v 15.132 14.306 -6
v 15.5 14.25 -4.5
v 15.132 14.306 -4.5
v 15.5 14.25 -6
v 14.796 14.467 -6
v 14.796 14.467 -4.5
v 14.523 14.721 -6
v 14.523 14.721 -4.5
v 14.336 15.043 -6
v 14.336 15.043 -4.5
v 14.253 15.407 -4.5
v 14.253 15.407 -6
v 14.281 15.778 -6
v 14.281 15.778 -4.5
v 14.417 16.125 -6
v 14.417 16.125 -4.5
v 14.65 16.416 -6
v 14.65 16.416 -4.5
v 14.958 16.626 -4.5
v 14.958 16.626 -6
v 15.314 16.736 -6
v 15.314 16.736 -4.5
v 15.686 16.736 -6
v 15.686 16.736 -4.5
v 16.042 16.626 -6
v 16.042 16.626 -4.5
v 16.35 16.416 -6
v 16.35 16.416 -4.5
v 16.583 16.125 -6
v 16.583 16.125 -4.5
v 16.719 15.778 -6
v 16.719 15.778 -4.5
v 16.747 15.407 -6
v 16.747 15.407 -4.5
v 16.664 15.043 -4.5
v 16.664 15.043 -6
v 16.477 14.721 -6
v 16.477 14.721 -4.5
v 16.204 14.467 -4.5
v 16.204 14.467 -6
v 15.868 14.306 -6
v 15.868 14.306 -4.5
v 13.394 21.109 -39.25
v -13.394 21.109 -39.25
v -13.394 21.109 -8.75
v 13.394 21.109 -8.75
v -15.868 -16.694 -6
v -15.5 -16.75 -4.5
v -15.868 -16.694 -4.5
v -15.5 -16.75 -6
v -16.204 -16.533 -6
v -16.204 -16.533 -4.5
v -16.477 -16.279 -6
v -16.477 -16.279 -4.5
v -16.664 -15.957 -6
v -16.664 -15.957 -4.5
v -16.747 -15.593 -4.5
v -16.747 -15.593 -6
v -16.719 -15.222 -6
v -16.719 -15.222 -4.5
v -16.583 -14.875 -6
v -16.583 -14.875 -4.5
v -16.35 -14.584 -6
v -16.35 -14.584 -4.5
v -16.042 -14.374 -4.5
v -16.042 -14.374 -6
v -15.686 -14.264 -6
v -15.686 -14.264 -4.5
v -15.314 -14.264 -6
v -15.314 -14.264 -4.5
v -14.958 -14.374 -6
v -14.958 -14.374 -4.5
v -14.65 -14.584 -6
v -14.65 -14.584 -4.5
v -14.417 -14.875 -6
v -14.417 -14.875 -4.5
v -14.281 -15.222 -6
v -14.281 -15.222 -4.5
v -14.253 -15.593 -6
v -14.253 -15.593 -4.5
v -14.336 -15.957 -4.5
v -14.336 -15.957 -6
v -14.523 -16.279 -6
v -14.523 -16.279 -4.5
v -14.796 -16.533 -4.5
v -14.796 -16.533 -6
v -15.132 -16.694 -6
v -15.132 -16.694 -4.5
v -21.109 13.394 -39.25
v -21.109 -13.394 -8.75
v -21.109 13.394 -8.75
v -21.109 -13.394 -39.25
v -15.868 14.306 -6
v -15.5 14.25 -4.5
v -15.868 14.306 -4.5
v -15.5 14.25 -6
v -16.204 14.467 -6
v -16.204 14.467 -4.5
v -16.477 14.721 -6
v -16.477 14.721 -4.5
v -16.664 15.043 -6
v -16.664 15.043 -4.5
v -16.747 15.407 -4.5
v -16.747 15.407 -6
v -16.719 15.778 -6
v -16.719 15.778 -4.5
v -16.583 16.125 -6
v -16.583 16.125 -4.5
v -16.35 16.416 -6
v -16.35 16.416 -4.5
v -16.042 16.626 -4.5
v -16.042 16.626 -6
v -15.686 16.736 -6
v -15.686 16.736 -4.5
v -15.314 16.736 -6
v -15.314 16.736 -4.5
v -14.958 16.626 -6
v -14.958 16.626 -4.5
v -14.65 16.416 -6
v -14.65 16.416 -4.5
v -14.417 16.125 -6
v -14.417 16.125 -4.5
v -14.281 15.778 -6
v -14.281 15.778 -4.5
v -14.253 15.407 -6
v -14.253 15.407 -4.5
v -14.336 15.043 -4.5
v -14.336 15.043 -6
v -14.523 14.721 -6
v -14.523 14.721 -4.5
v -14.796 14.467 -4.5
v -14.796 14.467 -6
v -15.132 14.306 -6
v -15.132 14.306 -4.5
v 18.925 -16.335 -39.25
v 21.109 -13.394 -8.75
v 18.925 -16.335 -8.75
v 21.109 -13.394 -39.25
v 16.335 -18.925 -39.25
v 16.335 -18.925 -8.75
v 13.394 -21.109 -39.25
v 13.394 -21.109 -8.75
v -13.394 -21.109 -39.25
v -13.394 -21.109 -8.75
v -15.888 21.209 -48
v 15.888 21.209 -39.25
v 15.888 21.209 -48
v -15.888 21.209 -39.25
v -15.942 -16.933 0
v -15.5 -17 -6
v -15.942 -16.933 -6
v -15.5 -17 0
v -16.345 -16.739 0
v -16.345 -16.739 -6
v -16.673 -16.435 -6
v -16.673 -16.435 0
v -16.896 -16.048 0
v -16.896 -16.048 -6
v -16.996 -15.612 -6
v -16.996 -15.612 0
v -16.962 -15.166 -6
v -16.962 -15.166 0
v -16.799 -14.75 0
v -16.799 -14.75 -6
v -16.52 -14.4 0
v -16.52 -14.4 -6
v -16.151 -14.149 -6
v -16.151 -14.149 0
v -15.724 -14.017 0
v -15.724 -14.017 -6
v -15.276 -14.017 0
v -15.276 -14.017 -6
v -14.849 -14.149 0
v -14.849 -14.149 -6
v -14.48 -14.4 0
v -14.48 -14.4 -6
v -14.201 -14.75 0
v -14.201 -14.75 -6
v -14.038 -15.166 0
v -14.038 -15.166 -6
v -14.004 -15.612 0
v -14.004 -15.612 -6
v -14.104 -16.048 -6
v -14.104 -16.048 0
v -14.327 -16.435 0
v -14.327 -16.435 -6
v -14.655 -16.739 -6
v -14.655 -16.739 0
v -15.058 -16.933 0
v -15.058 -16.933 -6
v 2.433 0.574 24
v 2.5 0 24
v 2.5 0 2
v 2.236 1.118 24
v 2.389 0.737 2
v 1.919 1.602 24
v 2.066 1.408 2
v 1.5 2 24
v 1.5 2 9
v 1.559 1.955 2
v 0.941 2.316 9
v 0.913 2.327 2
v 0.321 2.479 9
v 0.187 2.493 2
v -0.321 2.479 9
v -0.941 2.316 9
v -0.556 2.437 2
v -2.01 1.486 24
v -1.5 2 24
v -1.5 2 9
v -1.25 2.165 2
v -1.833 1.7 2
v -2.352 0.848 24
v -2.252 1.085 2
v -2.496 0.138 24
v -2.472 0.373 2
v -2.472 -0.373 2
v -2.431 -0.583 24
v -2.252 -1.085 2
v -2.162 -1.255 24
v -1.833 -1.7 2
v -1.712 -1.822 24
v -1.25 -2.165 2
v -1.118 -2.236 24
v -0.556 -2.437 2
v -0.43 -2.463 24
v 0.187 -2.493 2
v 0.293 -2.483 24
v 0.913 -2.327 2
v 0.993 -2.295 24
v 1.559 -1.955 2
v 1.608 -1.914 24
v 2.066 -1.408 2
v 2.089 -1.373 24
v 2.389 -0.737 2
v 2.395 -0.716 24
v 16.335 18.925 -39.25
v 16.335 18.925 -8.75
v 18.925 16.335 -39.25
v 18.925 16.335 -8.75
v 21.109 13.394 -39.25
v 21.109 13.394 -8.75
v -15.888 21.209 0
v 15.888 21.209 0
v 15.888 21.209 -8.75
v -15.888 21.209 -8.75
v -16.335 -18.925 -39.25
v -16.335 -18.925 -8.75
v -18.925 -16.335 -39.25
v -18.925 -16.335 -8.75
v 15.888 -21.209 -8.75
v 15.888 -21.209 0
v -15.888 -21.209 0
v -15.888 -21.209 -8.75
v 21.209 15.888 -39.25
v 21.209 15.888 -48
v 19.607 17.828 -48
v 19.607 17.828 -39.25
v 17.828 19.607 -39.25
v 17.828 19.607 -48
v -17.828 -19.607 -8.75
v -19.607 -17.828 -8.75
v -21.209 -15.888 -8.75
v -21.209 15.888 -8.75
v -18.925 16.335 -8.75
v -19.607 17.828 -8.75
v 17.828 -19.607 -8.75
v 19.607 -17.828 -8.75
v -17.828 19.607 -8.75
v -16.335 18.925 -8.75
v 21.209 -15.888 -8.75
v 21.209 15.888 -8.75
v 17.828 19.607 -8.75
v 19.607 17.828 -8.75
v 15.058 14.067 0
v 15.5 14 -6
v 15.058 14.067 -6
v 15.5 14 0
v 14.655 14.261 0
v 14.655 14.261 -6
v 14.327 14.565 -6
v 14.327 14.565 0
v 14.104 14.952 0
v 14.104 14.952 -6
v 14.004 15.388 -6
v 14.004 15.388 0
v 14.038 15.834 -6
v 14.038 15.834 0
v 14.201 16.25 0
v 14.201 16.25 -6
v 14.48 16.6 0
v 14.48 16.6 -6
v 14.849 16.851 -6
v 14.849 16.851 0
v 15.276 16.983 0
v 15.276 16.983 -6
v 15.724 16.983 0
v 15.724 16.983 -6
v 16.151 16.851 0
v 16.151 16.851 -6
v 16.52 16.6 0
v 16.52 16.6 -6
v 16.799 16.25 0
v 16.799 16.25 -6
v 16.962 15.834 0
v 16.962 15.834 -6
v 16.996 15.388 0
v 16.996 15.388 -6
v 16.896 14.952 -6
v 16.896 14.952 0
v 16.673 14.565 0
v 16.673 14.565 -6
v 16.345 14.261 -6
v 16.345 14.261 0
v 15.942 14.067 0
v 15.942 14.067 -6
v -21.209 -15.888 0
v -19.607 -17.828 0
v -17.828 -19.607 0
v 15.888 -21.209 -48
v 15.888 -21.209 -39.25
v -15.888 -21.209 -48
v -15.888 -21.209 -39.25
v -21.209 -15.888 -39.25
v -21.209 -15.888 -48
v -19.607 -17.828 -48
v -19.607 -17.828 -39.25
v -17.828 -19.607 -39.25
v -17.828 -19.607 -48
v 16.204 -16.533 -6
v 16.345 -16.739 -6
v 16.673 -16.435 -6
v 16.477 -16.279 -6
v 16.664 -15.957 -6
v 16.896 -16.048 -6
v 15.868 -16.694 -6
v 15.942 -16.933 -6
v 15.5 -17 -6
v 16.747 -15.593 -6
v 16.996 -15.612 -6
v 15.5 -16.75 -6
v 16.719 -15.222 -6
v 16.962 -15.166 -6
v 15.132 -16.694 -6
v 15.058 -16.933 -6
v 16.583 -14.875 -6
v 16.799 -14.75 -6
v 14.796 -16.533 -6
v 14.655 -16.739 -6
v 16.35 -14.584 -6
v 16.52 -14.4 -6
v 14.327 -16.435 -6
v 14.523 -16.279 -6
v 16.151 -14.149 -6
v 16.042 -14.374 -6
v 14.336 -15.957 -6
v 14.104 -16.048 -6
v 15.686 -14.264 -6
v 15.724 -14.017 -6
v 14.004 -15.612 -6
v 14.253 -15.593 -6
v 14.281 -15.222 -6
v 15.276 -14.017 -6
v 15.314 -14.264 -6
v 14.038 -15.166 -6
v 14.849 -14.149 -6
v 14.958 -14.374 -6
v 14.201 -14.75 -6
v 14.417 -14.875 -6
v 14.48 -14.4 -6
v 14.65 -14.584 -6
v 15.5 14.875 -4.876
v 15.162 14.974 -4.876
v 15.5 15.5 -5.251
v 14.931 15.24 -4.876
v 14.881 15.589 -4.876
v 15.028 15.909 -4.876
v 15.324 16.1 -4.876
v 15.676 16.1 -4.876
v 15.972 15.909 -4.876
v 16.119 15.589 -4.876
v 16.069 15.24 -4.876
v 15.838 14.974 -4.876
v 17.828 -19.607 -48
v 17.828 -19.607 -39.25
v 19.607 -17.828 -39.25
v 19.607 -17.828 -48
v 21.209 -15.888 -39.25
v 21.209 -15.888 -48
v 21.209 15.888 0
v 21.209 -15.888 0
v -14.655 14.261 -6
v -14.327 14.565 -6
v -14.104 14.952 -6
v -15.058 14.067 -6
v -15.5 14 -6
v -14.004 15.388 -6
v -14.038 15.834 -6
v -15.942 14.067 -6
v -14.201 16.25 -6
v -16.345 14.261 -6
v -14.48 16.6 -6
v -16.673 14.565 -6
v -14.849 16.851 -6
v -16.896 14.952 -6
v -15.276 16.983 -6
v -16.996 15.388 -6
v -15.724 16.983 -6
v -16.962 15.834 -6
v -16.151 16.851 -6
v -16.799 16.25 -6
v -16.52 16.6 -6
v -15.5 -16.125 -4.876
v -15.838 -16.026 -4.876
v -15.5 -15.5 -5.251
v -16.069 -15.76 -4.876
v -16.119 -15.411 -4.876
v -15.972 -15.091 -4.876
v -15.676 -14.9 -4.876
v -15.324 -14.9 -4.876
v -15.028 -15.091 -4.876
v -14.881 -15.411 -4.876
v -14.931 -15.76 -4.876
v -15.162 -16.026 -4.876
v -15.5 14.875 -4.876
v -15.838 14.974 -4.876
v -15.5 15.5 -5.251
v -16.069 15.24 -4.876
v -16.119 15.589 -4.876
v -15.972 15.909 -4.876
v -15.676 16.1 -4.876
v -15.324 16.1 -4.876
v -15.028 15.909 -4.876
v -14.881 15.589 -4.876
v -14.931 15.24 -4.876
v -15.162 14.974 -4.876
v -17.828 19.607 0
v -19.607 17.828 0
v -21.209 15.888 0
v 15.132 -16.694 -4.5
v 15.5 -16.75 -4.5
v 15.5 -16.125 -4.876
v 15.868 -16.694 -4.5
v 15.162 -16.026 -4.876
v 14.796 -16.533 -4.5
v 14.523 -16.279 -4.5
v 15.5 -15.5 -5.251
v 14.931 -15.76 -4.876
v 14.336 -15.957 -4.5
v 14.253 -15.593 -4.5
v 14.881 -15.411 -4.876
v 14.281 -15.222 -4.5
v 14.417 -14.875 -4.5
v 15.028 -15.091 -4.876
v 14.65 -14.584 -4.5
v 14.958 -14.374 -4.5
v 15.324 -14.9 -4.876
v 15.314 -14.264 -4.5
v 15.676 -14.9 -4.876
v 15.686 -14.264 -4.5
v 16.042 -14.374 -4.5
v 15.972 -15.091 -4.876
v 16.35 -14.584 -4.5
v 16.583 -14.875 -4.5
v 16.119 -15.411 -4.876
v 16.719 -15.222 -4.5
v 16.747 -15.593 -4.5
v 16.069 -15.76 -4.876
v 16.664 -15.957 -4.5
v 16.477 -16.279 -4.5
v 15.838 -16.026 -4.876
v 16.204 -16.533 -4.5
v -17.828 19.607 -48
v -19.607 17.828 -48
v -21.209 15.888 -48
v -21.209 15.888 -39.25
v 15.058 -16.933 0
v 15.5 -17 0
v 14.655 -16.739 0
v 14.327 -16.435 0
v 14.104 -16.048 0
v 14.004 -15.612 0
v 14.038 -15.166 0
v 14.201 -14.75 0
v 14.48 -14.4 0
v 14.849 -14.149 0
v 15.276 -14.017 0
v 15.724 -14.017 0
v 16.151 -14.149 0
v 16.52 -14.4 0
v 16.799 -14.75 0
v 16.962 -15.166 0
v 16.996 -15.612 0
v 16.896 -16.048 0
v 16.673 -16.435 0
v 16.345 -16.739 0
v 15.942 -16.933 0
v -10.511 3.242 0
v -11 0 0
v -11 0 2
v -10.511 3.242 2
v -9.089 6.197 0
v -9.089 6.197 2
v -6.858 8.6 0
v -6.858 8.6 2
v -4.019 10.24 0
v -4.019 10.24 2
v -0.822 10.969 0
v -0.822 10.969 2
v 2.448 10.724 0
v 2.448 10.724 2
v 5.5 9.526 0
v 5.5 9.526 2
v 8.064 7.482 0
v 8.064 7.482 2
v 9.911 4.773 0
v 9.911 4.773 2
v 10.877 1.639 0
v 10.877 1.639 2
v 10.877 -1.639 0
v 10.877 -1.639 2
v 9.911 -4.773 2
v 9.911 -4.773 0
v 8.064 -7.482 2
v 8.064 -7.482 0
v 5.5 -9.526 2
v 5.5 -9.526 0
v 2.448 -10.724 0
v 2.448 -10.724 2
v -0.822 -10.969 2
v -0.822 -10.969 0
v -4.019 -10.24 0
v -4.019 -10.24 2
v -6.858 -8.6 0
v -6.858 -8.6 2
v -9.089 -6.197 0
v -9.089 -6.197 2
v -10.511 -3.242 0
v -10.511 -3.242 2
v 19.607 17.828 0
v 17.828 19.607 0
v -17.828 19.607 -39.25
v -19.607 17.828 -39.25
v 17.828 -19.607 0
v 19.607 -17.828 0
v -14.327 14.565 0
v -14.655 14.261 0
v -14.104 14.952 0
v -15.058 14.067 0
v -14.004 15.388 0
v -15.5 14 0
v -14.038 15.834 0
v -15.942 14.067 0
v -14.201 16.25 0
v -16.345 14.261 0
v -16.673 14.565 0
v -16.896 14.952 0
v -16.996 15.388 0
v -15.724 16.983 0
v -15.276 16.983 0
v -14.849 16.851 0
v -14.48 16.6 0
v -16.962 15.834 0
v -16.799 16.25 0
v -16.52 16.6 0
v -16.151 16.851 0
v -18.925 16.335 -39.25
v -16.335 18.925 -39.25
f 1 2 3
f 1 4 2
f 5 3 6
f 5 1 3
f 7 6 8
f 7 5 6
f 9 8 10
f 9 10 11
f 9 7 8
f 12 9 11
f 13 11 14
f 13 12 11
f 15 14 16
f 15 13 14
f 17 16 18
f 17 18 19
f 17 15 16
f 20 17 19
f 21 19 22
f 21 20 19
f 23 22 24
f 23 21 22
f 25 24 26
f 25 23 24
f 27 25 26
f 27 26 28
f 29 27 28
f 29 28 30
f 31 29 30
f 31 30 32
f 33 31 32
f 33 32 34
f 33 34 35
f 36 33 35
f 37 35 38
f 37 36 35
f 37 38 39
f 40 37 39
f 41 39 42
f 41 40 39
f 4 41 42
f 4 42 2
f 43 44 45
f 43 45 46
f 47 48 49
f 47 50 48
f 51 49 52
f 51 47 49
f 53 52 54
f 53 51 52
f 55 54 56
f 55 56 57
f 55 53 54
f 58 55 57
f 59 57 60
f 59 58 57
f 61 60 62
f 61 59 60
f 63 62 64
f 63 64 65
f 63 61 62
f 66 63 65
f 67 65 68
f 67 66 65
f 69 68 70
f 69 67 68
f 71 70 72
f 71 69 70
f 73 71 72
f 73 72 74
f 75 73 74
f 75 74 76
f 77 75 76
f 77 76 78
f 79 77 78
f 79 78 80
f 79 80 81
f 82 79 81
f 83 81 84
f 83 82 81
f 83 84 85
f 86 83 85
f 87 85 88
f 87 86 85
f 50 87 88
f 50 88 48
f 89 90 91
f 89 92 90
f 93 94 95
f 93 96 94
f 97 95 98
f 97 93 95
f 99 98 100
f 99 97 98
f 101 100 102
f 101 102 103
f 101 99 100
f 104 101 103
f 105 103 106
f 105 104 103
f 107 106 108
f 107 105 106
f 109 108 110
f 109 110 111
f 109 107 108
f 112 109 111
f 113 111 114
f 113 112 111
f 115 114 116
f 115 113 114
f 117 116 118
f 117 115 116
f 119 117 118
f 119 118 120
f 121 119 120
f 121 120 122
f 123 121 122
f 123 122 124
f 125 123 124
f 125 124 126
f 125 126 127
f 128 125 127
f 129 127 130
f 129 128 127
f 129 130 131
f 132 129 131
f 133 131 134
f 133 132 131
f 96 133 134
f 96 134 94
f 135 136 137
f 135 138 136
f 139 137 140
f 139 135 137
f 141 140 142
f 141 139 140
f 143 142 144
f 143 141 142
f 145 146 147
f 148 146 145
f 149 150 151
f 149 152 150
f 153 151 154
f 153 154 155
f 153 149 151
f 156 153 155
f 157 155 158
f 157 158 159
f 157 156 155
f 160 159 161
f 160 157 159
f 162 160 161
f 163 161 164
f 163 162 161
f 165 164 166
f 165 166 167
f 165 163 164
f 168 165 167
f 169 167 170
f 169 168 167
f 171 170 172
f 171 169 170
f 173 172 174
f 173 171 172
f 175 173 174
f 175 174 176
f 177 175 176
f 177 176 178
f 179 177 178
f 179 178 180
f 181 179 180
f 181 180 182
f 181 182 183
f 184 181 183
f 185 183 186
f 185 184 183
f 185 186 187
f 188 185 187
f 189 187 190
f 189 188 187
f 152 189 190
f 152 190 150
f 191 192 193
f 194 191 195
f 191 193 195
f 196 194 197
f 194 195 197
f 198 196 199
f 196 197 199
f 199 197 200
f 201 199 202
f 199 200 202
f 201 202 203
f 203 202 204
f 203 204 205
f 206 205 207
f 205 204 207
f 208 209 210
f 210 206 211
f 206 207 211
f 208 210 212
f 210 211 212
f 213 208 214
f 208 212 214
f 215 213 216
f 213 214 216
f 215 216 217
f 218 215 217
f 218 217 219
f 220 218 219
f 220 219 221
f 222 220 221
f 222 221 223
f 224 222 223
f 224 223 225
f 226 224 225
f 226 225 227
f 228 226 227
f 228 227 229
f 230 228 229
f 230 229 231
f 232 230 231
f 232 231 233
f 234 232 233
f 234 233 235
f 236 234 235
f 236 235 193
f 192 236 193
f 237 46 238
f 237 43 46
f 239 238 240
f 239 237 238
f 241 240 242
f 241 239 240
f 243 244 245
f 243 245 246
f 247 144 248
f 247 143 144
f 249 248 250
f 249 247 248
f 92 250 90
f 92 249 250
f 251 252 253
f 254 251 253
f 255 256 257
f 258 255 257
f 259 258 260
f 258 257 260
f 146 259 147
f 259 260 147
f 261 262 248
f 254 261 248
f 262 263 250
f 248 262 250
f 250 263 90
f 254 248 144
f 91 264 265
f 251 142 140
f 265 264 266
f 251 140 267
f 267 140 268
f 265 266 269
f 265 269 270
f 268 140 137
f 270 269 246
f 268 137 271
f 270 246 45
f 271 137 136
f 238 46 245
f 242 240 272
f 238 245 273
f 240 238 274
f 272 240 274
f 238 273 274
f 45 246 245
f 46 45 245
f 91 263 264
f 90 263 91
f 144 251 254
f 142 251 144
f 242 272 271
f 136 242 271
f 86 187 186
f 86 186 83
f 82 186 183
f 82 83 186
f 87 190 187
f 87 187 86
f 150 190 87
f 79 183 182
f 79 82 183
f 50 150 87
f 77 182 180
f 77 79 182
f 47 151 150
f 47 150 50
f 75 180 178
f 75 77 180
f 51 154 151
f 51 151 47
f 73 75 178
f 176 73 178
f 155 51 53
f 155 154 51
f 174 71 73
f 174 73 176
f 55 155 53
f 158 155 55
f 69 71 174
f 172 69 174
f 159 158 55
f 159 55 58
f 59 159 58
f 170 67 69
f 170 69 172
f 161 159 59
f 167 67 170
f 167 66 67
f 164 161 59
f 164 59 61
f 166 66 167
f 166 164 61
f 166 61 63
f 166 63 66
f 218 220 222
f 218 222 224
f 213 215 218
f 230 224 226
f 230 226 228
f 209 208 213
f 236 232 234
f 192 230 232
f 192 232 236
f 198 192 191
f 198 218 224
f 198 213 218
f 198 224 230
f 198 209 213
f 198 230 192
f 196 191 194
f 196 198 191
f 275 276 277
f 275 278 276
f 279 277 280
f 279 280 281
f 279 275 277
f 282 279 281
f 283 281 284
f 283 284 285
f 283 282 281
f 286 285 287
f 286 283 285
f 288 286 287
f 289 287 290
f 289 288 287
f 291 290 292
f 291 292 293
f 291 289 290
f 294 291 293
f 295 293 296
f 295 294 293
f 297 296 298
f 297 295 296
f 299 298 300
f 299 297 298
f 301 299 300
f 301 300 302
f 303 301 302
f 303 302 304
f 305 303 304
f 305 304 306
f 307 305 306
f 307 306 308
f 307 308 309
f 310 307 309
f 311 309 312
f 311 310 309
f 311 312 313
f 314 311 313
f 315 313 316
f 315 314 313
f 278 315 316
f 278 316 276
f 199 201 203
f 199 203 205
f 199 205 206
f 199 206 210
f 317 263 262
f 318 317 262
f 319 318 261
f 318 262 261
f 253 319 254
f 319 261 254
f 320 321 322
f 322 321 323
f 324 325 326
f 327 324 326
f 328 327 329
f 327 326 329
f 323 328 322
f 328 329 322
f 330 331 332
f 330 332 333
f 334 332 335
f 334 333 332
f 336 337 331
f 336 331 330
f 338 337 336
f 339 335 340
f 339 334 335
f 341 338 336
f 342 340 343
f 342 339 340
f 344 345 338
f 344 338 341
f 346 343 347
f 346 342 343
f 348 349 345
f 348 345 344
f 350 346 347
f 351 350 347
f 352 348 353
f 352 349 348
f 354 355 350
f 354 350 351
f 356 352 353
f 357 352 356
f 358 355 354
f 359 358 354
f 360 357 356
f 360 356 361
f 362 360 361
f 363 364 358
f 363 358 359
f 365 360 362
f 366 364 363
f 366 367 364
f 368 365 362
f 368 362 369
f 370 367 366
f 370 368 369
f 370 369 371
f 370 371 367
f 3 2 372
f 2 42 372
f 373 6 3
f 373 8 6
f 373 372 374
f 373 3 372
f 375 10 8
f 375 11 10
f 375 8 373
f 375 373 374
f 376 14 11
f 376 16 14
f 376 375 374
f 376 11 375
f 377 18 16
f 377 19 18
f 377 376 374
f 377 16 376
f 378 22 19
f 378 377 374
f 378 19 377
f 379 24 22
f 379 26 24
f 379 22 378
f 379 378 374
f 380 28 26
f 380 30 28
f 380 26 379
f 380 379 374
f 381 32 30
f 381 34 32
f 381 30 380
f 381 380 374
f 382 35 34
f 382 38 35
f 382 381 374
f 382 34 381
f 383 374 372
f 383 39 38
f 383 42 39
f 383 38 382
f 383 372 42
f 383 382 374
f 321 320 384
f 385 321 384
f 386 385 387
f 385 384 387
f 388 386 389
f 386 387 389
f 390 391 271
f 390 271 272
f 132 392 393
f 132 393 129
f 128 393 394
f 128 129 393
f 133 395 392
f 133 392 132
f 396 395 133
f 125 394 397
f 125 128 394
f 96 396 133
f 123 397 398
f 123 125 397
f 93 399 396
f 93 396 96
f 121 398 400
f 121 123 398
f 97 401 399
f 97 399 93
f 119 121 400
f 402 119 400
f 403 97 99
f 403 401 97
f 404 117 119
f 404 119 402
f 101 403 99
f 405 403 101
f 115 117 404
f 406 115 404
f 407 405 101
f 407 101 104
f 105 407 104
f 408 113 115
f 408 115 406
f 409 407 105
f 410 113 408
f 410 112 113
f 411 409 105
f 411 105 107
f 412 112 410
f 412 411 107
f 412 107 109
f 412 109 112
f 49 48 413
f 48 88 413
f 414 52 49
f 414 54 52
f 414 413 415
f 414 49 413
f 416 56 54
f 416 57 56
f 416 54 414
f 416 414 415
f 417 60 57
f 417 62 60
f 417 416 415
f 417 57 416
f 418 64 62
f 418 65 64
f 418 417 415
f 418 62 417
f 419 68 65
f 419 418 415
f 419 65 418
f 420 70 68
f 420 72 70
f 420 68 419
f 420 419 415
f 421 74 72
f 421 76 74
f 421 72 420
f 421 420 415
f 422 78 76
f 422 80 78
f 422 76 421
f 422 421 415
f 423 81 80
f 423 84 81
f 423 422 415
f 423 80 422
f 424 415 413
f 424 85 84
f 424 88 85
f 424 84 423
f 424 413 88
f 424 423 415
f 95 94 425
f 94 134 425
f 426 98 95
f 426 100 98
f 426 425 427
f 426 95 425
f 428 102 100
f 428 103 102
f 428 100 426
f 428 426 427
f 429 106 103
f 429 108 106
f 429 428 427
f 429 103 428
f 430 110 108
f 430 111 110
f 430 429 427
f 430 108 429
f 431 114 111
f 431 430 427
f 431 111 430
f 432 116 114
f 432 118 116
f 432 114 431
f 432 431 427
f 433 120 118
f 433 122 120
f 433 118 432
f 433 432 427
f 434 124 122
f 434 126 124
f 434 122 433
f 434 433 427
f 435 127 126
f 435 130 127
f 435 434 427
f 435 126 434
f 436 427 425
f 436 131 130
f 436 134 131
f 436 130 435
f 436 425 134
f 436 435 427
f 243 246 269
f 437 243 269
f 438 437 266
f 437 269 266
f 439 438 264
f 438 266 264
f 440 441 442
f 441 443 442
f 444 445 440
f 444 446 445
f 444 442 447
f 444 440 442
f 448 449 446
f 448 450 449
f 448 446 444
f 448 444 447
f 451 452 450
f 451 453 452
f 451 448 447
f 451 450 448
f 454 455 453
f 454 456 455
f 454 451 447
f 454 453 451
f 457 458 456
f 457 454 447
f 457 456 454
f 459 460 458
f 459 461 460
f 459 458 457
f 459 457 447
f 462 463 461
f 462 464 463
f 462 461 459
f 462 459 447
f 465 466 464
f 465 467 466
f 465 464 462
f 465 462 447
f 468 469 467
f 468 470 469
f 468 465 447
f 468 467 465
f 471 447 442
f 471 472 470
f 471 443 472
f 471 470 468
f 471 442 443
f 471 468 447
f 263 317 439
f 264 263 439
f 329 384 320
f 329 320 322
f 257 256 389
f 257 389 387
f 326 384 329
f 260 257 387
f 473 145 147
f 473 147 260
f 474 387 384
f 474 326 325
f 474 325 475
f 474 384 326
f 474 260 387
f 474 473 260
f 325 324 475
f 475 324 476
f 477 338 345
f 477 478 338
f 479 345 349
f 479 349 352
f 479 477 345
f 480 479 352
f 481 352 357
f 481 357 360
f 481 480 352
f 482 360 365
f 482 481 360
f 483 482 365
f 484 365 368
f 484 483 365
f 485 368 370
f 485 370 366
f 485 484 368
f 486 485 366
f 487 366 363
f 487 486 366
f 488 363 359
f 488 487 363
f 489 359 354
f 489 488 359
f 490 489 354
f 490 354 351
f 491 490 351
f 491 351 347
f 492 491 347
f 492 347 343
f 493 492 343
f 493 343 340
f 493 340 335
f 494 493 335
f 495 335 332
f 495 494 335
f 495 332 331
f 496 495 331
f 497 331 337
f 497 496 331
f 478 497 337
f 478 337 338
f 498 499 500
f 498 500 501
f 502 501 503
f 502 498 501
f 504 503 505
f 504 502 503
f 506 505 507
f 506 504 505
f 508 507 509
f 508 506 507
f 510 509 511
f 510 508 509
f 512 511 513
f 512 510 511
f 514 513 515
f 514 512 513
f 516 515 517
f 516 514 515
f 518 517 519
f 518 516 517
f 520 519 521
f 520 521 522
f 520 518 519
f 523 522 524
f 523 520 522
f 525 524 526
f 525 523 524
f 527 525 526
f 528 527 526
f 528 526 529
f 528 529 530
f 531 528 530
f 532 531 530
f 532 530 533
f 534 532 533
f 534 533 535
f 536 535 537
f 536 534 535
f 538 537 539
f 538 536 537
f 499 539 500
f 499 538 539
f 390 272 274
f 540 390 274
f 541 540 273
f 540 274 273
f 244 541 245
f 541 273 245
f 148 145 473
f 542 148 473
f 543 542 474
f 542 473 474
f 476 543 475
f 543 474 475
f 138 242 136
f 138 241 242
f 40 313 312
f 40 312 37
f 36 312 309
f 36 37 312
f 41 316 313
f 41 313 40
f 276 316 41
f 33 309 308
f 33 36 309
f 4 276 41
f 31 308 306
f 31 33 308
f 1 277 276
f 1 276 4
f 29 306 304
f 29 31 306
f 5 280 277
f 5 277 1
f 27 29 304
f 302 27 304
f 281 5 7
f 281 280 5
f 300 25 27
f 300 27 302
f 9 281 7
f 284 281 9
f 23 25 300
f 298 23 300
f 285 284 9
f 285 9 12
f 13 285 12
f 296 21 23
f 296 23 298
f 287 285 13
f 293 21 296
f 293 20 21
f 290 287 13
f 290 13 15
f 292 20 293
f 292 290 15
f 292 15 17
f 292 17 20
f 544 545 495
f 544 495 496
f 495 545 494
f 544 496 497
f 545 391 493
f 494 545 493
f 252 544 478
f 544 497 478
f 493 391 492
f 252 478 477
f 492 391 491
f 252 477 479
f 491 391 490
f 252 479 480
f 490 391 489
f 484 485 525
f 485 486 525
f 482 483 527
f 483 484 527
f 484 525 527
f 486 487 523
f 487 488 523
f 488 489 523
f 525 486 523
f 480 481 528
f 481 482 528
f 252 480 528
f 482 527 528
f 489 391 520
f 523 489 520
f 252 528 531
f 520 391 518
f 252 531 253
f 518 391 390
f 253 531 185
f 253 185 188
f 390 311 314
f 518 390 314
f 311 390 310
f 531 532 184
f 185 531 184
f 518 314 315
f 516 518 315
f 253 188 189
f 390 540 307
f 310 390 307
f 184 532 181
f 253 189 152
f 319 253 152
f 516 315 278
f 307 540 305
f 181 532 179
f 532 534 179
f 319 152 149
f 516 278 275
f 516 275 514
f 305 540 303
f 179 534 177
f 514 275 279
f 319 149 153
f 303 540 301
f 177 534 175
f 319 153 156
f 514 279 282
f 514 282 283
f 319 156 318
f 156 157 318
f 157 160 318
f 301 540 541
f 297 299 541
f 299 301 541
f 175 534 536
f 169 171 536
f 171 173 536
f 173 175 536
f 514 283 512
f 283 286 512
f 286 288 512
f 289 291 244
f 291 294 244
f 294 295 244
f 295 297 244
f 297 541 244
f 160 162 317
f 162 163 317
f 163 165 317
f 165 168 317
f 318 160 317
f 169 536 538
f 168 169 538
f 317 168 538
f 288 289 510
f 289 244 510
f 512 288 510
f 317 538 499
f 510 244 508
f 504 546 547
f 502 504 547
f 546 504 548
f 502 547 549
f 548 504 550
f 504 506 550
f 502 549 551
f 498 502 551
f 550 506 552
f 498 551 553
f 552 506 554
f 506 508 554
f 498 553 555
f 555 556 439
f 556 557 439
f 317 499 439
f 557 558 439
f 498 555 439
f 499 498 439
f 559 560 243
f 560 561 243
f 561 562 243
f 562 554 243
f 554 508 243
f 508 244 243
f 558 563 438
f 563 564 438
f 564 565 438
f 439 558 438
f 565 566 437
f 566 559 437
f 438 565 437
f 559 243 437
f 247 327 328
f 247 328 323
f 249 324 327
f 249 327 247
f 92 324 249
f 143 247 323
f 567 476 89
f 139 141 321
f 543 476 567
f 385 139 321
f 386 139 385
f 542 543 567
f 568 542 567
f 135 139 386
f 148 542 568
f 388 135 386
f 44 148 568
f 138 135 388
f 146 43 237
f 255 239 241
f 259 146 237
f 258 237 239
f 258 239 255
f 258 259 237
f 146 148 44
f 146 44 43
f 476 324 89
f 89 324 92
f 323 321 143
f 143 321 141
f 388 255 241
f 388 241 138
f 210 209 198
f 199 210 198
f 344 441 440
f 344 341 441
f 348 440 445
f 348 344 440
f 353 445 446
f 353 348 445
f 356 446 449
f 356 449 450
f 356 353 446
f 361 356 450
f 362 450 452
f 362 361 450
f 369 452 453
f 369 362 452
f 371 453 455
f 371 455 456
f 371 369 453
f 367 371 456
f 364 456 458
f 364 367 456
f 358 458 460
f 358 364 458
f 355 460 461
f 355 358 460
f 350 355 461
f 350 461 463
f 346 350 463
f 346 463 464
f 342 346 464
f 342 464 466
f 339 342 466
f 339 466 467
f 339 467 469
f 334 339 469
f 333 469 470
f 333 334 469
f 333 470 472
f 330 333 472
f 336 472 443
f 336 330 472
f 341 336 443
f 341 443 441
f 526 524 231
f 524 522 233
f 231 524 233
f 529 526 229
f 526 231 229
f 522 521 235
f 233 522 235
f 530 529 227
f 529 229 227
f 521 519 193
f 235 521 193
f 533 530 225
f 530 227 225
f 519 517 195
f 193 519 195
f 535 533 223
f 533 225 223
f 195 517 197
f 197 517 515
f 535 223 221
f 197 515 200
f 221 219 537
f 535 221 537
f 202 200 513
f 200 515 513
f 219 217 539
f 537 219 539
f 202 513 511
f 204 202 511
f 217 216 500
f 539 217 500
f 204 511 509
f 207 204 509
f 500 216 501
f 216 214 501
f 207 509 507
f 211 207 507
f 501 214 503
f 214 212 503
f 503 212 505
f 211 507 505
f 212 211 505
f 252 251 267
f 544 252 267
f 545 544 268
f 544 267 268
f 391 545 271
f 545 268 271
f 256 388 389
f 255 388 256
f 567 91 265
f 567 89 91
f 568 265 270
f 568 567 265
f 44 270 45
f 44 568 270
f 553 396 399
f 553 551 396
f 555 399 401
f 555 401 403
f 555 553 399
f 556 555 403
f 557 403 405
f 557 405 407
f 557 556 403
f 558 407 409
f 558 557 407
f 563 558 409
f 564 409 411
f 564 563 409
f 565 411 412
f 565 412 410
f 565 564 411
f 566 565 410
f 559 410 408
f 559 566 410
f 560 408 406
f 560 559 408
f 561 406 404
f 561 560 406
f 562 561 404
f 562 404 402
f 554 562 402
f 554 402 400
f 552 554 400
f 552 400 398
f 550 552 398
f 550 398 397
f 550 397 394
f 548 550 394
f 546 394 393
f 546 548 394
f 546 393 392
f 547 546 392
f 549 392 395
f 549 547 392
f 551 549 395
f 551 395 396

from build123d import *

# Parameters (mm, degrees)
SKETCH1_R                      = 2.5
BOSS_EXTRUDE1_DEPTH            = 24
SKETCH2_R                      = 11
BOSS_EXTRUDE2_DEPTH            = 2
SKETCH3_W                      = 42.418
SKETCH3_H                      = 42.418
BOSS_EXTRUDE3_DEPTH            = 48
CUT_EXTRUDE1_DEPTH             = 73
M3X0_5_TAPPED_HOLE1_AT_2_COUNT = 2
M3X0_5_TAPPED_HOLE1_AT_2_PITCH = 31
M3X0_5_TAPPED_HOLE1_AT_3_COUNT = 2
M3X0_5_TAPPED_HOLE1_AT_3_PITCH = 43.840620434
M3X0_5_TAPPED_HOLE1_AT_4_COUNT = 2
M3X0_5_TAPPED_HOLE1_AT_4_PITCH = 31
CUT_EXTRUDE2_DEPTH             = 15
CUT_EXTRUDE3_DEPTH             = 15.25
CUT_EXTRUDE3_DEPTH_BACK        = 15.25


with BuildPart() as part:
    # Sketch1 → Boss-Extrude1 (new body)
    with BuildSketch(Plane.XY):
        Circle(SKETCH1_R)
    extrude(amount=BOSS_EXTRUDE1_DEPTH)

    # Sketch2 → Boss-Extrude2 (add)
    with BuildSketch(Plane(origin=(0, 0, 0), x_dir=(-1, 0, 0), z_dir=(0, 0, -1))):
        Circle(SKETCH2_R)
    extrude(amount=-BOSS_EXTRUDE2_DEPTH)

    # Sketch3 → Boss-Extrude3 (add)
    with BuildSketch(Plane(origin=(0, 0, 0), x_dir=(-1, 0, 0), z_dir=(0, 0, -1))):
        Rectangle(SKETCH3_W, SKETCH3_H)
    extrude(amount=BOSS_EXTRUDE3_DEPTH)

    # Sketch4 → Cut-Extrude1 (cut, through all)
    with BuildSketch(Plane(origin=(0, 0, -48), x_dir=(-1, 0, 0), z_dir=(0, 0, -1))):
        with BuildLine():
            Line((-21.209, -15.887992919), (-21.209, -21.209))
            Line((-21.209, -21.209), (-15.887992919, -21.209))
            ThreePointArc((-15.887992919, -21.209), (-18.738329701, -18.738329701), (-21.209, -15.887992919))
        make_face()
        with BuildLine():
            Line((15.887992919, -21.209), (21.209, -21.209))
            Line((21.209, -21.209), (21.209, -15.887992919))
            ThreePointArc((21.209, -15.887992919), (18.738329701, -18.738329701), (15.887992919, -21.209))
        make_face()
        with BuildLine():
            Line((21.209, 15.887992919), (21.209, 21.209))
            Line((21.209, 21.209), (15.887992919, 21.209))
            ThreePointArc((15.887992919, 21.209), (18.738329701, 18.738329701), (21.209, 15.887992919))
        make_face()
        with BuildLine():
            Line((-15.887992919, 21.209), (-21.209, 21.209))
            Line((-21.209, 21.209), (-21.209, 15.887992919))
            ThreePointArc((-21.209, 15.887992919), (-18.738329701, 18.738329701), (-15.887992919, 21.209))
        make_face()
    extrude(amount=-CUT_EXTRUDE1_DEPTH, mode=Mode.SUBTRACT)

    # Sketch5 → M3x0.5 Tapped Hole1 (revolve, cut)
    with BuildSketch(Plane(origin=(-15.5, 15.5, 0), x_dir=(0, -1, 0), z_dir=(1, 0, 0))):
        Polygon((0, 0), (0, 5.251075774), (1.25, 4.5), (1.25, 6), (1.5, 6), (1.5, 0), align=None)
    m3x0_5_tapped_hole1 = revolve(axis=Axis((-15.5, 15.5, 6.35), (0, 0, -1)), mode=Mode.SUBTRACT)

    # M3x0.5 Tapped Hole1 at 2: M3x0.5 Tapped Hole1 ×2
    with Locations(*[(0, -i * M3X0_5_TAPPED_HOLE1_AT_2_PITCH, 0) for i in range(1, M3X0_5_TAPPED_HOLE1_AT_2_COUNT)]):
        add(m3x0_5_tapped_hole1, mode=Mode.SUBTRACT)

    # M3x0.5 Tapped Hole1 at 3: M3x0.5 Tapped Hole1 ×2
    with Locations(*[Vector(0.707106781, -0.707106781, 0) * (i * M3X0_5_TAPPED_HOLE1_AT_3_PITCH) for i in range(1, M3X0_5_TAPPED_HOLE1_AT_3_COUNT)]):
        add(m3x0_5_tapped_hole1, mode=Mode.SUBTRACT)

    # M3x0.5 Tapped Hole1 at 4: M3x0.5 Tapped Hole1 ×2
    with Locations(*[(i * M3X0_5_TAPPED_HOLE1_AT_4_PITCH, 0, 0) for i in range(1, M3X0_5_TAPPED_HOLE1_AT_4_COUNT)]):
        add(m3x0_5_tapped_hole1, mode=Mode.SUBTRACT)

    # Sketch7 → Cut-Extrude2 (cut)
    with BuildSketch(Plane.XY.offset(24)):
        with BuildLine():
            Line((-1.5, 2), (1.5, 2))
            ThreePointArc((1.5, 2), (0, 2.5), (-1.5, 2))
        make_face()
    extrude(amount=-CUT_EXTRUDE2_DEPTH, mode=Mode.SUBTRACT)

    # Sketch8 → Cut-Extrude3 (cut, two sides)
    with BuildSketch(Plane.XY.offset(-24)) as cut_extrude3_sk:
        with BuildLine():
            Line((15.887992919, 21.209), (-15.887992919, 21.209))
            ThreePointArc((-15.887992919, 21.209), (-18.738329701, 18.738329701), (-21.209, 15.887992919))
            Line((-21.209, 15.887992919), (-21.209, -15.887992919))
            ThreePointArc((-21.209, -15.887992919), (-18.738329701, -18.738329701), (-15.887992919, -21.209))
            Line((-15.887992919, -21.209), (15.887992919, -21.209))
            ThreePointArc((15.887992919, -21.209), (18.738329701, -18.738329701), (21.209, -15.887992919))
            Line((21.209, -15.887992919), (21.209, 15.887992919))
            ThreePointArc((21.209, 15.887992919), (18.738329701, 18.738329701), (15.887992919, 21.209))
        make_face()
        with BuildLine():
            Line((-13.394406258, 21.109), (13.394406258, 21.109))
            ThreePointArc((13.394406258, 21.109), (17.67766953, 17.67766953), (21.109, 13.394406258))
            Line((21.109, 13.394406258), (21.109, -13.394406258))
            ThreePointArc((21.109, -13.394406258), (17.67766953, -17.67766953), (13.394406258, -21.109))
            Line((13.394406258, -21.109), (-13.394406258, -21.109))
            ThreePointArc((-13.394406258, -21.109), (-17.67766953, -17.67766953), (-21.109, -13.394406258))
            Line((-21.109, -13.394406258), (-21.109, 13.394406258))
            ThreePointArc((-21.109, 13.394406258), (-17.67766953, 17.67766953), (-13.394406258, 21.109))
        make_face(mode=Mode.SUBTRACT)
    extrude(amount=CUT_EXTRUDE3_DEPTH, mode=Mode.SUBTRACT)
    extrude(cut_extrude3_sk.sketch, amount=-CUT_EXTRUDE3_DEPTH_BACK, mode=Mode.SUBTRACT)


solid = part.part
